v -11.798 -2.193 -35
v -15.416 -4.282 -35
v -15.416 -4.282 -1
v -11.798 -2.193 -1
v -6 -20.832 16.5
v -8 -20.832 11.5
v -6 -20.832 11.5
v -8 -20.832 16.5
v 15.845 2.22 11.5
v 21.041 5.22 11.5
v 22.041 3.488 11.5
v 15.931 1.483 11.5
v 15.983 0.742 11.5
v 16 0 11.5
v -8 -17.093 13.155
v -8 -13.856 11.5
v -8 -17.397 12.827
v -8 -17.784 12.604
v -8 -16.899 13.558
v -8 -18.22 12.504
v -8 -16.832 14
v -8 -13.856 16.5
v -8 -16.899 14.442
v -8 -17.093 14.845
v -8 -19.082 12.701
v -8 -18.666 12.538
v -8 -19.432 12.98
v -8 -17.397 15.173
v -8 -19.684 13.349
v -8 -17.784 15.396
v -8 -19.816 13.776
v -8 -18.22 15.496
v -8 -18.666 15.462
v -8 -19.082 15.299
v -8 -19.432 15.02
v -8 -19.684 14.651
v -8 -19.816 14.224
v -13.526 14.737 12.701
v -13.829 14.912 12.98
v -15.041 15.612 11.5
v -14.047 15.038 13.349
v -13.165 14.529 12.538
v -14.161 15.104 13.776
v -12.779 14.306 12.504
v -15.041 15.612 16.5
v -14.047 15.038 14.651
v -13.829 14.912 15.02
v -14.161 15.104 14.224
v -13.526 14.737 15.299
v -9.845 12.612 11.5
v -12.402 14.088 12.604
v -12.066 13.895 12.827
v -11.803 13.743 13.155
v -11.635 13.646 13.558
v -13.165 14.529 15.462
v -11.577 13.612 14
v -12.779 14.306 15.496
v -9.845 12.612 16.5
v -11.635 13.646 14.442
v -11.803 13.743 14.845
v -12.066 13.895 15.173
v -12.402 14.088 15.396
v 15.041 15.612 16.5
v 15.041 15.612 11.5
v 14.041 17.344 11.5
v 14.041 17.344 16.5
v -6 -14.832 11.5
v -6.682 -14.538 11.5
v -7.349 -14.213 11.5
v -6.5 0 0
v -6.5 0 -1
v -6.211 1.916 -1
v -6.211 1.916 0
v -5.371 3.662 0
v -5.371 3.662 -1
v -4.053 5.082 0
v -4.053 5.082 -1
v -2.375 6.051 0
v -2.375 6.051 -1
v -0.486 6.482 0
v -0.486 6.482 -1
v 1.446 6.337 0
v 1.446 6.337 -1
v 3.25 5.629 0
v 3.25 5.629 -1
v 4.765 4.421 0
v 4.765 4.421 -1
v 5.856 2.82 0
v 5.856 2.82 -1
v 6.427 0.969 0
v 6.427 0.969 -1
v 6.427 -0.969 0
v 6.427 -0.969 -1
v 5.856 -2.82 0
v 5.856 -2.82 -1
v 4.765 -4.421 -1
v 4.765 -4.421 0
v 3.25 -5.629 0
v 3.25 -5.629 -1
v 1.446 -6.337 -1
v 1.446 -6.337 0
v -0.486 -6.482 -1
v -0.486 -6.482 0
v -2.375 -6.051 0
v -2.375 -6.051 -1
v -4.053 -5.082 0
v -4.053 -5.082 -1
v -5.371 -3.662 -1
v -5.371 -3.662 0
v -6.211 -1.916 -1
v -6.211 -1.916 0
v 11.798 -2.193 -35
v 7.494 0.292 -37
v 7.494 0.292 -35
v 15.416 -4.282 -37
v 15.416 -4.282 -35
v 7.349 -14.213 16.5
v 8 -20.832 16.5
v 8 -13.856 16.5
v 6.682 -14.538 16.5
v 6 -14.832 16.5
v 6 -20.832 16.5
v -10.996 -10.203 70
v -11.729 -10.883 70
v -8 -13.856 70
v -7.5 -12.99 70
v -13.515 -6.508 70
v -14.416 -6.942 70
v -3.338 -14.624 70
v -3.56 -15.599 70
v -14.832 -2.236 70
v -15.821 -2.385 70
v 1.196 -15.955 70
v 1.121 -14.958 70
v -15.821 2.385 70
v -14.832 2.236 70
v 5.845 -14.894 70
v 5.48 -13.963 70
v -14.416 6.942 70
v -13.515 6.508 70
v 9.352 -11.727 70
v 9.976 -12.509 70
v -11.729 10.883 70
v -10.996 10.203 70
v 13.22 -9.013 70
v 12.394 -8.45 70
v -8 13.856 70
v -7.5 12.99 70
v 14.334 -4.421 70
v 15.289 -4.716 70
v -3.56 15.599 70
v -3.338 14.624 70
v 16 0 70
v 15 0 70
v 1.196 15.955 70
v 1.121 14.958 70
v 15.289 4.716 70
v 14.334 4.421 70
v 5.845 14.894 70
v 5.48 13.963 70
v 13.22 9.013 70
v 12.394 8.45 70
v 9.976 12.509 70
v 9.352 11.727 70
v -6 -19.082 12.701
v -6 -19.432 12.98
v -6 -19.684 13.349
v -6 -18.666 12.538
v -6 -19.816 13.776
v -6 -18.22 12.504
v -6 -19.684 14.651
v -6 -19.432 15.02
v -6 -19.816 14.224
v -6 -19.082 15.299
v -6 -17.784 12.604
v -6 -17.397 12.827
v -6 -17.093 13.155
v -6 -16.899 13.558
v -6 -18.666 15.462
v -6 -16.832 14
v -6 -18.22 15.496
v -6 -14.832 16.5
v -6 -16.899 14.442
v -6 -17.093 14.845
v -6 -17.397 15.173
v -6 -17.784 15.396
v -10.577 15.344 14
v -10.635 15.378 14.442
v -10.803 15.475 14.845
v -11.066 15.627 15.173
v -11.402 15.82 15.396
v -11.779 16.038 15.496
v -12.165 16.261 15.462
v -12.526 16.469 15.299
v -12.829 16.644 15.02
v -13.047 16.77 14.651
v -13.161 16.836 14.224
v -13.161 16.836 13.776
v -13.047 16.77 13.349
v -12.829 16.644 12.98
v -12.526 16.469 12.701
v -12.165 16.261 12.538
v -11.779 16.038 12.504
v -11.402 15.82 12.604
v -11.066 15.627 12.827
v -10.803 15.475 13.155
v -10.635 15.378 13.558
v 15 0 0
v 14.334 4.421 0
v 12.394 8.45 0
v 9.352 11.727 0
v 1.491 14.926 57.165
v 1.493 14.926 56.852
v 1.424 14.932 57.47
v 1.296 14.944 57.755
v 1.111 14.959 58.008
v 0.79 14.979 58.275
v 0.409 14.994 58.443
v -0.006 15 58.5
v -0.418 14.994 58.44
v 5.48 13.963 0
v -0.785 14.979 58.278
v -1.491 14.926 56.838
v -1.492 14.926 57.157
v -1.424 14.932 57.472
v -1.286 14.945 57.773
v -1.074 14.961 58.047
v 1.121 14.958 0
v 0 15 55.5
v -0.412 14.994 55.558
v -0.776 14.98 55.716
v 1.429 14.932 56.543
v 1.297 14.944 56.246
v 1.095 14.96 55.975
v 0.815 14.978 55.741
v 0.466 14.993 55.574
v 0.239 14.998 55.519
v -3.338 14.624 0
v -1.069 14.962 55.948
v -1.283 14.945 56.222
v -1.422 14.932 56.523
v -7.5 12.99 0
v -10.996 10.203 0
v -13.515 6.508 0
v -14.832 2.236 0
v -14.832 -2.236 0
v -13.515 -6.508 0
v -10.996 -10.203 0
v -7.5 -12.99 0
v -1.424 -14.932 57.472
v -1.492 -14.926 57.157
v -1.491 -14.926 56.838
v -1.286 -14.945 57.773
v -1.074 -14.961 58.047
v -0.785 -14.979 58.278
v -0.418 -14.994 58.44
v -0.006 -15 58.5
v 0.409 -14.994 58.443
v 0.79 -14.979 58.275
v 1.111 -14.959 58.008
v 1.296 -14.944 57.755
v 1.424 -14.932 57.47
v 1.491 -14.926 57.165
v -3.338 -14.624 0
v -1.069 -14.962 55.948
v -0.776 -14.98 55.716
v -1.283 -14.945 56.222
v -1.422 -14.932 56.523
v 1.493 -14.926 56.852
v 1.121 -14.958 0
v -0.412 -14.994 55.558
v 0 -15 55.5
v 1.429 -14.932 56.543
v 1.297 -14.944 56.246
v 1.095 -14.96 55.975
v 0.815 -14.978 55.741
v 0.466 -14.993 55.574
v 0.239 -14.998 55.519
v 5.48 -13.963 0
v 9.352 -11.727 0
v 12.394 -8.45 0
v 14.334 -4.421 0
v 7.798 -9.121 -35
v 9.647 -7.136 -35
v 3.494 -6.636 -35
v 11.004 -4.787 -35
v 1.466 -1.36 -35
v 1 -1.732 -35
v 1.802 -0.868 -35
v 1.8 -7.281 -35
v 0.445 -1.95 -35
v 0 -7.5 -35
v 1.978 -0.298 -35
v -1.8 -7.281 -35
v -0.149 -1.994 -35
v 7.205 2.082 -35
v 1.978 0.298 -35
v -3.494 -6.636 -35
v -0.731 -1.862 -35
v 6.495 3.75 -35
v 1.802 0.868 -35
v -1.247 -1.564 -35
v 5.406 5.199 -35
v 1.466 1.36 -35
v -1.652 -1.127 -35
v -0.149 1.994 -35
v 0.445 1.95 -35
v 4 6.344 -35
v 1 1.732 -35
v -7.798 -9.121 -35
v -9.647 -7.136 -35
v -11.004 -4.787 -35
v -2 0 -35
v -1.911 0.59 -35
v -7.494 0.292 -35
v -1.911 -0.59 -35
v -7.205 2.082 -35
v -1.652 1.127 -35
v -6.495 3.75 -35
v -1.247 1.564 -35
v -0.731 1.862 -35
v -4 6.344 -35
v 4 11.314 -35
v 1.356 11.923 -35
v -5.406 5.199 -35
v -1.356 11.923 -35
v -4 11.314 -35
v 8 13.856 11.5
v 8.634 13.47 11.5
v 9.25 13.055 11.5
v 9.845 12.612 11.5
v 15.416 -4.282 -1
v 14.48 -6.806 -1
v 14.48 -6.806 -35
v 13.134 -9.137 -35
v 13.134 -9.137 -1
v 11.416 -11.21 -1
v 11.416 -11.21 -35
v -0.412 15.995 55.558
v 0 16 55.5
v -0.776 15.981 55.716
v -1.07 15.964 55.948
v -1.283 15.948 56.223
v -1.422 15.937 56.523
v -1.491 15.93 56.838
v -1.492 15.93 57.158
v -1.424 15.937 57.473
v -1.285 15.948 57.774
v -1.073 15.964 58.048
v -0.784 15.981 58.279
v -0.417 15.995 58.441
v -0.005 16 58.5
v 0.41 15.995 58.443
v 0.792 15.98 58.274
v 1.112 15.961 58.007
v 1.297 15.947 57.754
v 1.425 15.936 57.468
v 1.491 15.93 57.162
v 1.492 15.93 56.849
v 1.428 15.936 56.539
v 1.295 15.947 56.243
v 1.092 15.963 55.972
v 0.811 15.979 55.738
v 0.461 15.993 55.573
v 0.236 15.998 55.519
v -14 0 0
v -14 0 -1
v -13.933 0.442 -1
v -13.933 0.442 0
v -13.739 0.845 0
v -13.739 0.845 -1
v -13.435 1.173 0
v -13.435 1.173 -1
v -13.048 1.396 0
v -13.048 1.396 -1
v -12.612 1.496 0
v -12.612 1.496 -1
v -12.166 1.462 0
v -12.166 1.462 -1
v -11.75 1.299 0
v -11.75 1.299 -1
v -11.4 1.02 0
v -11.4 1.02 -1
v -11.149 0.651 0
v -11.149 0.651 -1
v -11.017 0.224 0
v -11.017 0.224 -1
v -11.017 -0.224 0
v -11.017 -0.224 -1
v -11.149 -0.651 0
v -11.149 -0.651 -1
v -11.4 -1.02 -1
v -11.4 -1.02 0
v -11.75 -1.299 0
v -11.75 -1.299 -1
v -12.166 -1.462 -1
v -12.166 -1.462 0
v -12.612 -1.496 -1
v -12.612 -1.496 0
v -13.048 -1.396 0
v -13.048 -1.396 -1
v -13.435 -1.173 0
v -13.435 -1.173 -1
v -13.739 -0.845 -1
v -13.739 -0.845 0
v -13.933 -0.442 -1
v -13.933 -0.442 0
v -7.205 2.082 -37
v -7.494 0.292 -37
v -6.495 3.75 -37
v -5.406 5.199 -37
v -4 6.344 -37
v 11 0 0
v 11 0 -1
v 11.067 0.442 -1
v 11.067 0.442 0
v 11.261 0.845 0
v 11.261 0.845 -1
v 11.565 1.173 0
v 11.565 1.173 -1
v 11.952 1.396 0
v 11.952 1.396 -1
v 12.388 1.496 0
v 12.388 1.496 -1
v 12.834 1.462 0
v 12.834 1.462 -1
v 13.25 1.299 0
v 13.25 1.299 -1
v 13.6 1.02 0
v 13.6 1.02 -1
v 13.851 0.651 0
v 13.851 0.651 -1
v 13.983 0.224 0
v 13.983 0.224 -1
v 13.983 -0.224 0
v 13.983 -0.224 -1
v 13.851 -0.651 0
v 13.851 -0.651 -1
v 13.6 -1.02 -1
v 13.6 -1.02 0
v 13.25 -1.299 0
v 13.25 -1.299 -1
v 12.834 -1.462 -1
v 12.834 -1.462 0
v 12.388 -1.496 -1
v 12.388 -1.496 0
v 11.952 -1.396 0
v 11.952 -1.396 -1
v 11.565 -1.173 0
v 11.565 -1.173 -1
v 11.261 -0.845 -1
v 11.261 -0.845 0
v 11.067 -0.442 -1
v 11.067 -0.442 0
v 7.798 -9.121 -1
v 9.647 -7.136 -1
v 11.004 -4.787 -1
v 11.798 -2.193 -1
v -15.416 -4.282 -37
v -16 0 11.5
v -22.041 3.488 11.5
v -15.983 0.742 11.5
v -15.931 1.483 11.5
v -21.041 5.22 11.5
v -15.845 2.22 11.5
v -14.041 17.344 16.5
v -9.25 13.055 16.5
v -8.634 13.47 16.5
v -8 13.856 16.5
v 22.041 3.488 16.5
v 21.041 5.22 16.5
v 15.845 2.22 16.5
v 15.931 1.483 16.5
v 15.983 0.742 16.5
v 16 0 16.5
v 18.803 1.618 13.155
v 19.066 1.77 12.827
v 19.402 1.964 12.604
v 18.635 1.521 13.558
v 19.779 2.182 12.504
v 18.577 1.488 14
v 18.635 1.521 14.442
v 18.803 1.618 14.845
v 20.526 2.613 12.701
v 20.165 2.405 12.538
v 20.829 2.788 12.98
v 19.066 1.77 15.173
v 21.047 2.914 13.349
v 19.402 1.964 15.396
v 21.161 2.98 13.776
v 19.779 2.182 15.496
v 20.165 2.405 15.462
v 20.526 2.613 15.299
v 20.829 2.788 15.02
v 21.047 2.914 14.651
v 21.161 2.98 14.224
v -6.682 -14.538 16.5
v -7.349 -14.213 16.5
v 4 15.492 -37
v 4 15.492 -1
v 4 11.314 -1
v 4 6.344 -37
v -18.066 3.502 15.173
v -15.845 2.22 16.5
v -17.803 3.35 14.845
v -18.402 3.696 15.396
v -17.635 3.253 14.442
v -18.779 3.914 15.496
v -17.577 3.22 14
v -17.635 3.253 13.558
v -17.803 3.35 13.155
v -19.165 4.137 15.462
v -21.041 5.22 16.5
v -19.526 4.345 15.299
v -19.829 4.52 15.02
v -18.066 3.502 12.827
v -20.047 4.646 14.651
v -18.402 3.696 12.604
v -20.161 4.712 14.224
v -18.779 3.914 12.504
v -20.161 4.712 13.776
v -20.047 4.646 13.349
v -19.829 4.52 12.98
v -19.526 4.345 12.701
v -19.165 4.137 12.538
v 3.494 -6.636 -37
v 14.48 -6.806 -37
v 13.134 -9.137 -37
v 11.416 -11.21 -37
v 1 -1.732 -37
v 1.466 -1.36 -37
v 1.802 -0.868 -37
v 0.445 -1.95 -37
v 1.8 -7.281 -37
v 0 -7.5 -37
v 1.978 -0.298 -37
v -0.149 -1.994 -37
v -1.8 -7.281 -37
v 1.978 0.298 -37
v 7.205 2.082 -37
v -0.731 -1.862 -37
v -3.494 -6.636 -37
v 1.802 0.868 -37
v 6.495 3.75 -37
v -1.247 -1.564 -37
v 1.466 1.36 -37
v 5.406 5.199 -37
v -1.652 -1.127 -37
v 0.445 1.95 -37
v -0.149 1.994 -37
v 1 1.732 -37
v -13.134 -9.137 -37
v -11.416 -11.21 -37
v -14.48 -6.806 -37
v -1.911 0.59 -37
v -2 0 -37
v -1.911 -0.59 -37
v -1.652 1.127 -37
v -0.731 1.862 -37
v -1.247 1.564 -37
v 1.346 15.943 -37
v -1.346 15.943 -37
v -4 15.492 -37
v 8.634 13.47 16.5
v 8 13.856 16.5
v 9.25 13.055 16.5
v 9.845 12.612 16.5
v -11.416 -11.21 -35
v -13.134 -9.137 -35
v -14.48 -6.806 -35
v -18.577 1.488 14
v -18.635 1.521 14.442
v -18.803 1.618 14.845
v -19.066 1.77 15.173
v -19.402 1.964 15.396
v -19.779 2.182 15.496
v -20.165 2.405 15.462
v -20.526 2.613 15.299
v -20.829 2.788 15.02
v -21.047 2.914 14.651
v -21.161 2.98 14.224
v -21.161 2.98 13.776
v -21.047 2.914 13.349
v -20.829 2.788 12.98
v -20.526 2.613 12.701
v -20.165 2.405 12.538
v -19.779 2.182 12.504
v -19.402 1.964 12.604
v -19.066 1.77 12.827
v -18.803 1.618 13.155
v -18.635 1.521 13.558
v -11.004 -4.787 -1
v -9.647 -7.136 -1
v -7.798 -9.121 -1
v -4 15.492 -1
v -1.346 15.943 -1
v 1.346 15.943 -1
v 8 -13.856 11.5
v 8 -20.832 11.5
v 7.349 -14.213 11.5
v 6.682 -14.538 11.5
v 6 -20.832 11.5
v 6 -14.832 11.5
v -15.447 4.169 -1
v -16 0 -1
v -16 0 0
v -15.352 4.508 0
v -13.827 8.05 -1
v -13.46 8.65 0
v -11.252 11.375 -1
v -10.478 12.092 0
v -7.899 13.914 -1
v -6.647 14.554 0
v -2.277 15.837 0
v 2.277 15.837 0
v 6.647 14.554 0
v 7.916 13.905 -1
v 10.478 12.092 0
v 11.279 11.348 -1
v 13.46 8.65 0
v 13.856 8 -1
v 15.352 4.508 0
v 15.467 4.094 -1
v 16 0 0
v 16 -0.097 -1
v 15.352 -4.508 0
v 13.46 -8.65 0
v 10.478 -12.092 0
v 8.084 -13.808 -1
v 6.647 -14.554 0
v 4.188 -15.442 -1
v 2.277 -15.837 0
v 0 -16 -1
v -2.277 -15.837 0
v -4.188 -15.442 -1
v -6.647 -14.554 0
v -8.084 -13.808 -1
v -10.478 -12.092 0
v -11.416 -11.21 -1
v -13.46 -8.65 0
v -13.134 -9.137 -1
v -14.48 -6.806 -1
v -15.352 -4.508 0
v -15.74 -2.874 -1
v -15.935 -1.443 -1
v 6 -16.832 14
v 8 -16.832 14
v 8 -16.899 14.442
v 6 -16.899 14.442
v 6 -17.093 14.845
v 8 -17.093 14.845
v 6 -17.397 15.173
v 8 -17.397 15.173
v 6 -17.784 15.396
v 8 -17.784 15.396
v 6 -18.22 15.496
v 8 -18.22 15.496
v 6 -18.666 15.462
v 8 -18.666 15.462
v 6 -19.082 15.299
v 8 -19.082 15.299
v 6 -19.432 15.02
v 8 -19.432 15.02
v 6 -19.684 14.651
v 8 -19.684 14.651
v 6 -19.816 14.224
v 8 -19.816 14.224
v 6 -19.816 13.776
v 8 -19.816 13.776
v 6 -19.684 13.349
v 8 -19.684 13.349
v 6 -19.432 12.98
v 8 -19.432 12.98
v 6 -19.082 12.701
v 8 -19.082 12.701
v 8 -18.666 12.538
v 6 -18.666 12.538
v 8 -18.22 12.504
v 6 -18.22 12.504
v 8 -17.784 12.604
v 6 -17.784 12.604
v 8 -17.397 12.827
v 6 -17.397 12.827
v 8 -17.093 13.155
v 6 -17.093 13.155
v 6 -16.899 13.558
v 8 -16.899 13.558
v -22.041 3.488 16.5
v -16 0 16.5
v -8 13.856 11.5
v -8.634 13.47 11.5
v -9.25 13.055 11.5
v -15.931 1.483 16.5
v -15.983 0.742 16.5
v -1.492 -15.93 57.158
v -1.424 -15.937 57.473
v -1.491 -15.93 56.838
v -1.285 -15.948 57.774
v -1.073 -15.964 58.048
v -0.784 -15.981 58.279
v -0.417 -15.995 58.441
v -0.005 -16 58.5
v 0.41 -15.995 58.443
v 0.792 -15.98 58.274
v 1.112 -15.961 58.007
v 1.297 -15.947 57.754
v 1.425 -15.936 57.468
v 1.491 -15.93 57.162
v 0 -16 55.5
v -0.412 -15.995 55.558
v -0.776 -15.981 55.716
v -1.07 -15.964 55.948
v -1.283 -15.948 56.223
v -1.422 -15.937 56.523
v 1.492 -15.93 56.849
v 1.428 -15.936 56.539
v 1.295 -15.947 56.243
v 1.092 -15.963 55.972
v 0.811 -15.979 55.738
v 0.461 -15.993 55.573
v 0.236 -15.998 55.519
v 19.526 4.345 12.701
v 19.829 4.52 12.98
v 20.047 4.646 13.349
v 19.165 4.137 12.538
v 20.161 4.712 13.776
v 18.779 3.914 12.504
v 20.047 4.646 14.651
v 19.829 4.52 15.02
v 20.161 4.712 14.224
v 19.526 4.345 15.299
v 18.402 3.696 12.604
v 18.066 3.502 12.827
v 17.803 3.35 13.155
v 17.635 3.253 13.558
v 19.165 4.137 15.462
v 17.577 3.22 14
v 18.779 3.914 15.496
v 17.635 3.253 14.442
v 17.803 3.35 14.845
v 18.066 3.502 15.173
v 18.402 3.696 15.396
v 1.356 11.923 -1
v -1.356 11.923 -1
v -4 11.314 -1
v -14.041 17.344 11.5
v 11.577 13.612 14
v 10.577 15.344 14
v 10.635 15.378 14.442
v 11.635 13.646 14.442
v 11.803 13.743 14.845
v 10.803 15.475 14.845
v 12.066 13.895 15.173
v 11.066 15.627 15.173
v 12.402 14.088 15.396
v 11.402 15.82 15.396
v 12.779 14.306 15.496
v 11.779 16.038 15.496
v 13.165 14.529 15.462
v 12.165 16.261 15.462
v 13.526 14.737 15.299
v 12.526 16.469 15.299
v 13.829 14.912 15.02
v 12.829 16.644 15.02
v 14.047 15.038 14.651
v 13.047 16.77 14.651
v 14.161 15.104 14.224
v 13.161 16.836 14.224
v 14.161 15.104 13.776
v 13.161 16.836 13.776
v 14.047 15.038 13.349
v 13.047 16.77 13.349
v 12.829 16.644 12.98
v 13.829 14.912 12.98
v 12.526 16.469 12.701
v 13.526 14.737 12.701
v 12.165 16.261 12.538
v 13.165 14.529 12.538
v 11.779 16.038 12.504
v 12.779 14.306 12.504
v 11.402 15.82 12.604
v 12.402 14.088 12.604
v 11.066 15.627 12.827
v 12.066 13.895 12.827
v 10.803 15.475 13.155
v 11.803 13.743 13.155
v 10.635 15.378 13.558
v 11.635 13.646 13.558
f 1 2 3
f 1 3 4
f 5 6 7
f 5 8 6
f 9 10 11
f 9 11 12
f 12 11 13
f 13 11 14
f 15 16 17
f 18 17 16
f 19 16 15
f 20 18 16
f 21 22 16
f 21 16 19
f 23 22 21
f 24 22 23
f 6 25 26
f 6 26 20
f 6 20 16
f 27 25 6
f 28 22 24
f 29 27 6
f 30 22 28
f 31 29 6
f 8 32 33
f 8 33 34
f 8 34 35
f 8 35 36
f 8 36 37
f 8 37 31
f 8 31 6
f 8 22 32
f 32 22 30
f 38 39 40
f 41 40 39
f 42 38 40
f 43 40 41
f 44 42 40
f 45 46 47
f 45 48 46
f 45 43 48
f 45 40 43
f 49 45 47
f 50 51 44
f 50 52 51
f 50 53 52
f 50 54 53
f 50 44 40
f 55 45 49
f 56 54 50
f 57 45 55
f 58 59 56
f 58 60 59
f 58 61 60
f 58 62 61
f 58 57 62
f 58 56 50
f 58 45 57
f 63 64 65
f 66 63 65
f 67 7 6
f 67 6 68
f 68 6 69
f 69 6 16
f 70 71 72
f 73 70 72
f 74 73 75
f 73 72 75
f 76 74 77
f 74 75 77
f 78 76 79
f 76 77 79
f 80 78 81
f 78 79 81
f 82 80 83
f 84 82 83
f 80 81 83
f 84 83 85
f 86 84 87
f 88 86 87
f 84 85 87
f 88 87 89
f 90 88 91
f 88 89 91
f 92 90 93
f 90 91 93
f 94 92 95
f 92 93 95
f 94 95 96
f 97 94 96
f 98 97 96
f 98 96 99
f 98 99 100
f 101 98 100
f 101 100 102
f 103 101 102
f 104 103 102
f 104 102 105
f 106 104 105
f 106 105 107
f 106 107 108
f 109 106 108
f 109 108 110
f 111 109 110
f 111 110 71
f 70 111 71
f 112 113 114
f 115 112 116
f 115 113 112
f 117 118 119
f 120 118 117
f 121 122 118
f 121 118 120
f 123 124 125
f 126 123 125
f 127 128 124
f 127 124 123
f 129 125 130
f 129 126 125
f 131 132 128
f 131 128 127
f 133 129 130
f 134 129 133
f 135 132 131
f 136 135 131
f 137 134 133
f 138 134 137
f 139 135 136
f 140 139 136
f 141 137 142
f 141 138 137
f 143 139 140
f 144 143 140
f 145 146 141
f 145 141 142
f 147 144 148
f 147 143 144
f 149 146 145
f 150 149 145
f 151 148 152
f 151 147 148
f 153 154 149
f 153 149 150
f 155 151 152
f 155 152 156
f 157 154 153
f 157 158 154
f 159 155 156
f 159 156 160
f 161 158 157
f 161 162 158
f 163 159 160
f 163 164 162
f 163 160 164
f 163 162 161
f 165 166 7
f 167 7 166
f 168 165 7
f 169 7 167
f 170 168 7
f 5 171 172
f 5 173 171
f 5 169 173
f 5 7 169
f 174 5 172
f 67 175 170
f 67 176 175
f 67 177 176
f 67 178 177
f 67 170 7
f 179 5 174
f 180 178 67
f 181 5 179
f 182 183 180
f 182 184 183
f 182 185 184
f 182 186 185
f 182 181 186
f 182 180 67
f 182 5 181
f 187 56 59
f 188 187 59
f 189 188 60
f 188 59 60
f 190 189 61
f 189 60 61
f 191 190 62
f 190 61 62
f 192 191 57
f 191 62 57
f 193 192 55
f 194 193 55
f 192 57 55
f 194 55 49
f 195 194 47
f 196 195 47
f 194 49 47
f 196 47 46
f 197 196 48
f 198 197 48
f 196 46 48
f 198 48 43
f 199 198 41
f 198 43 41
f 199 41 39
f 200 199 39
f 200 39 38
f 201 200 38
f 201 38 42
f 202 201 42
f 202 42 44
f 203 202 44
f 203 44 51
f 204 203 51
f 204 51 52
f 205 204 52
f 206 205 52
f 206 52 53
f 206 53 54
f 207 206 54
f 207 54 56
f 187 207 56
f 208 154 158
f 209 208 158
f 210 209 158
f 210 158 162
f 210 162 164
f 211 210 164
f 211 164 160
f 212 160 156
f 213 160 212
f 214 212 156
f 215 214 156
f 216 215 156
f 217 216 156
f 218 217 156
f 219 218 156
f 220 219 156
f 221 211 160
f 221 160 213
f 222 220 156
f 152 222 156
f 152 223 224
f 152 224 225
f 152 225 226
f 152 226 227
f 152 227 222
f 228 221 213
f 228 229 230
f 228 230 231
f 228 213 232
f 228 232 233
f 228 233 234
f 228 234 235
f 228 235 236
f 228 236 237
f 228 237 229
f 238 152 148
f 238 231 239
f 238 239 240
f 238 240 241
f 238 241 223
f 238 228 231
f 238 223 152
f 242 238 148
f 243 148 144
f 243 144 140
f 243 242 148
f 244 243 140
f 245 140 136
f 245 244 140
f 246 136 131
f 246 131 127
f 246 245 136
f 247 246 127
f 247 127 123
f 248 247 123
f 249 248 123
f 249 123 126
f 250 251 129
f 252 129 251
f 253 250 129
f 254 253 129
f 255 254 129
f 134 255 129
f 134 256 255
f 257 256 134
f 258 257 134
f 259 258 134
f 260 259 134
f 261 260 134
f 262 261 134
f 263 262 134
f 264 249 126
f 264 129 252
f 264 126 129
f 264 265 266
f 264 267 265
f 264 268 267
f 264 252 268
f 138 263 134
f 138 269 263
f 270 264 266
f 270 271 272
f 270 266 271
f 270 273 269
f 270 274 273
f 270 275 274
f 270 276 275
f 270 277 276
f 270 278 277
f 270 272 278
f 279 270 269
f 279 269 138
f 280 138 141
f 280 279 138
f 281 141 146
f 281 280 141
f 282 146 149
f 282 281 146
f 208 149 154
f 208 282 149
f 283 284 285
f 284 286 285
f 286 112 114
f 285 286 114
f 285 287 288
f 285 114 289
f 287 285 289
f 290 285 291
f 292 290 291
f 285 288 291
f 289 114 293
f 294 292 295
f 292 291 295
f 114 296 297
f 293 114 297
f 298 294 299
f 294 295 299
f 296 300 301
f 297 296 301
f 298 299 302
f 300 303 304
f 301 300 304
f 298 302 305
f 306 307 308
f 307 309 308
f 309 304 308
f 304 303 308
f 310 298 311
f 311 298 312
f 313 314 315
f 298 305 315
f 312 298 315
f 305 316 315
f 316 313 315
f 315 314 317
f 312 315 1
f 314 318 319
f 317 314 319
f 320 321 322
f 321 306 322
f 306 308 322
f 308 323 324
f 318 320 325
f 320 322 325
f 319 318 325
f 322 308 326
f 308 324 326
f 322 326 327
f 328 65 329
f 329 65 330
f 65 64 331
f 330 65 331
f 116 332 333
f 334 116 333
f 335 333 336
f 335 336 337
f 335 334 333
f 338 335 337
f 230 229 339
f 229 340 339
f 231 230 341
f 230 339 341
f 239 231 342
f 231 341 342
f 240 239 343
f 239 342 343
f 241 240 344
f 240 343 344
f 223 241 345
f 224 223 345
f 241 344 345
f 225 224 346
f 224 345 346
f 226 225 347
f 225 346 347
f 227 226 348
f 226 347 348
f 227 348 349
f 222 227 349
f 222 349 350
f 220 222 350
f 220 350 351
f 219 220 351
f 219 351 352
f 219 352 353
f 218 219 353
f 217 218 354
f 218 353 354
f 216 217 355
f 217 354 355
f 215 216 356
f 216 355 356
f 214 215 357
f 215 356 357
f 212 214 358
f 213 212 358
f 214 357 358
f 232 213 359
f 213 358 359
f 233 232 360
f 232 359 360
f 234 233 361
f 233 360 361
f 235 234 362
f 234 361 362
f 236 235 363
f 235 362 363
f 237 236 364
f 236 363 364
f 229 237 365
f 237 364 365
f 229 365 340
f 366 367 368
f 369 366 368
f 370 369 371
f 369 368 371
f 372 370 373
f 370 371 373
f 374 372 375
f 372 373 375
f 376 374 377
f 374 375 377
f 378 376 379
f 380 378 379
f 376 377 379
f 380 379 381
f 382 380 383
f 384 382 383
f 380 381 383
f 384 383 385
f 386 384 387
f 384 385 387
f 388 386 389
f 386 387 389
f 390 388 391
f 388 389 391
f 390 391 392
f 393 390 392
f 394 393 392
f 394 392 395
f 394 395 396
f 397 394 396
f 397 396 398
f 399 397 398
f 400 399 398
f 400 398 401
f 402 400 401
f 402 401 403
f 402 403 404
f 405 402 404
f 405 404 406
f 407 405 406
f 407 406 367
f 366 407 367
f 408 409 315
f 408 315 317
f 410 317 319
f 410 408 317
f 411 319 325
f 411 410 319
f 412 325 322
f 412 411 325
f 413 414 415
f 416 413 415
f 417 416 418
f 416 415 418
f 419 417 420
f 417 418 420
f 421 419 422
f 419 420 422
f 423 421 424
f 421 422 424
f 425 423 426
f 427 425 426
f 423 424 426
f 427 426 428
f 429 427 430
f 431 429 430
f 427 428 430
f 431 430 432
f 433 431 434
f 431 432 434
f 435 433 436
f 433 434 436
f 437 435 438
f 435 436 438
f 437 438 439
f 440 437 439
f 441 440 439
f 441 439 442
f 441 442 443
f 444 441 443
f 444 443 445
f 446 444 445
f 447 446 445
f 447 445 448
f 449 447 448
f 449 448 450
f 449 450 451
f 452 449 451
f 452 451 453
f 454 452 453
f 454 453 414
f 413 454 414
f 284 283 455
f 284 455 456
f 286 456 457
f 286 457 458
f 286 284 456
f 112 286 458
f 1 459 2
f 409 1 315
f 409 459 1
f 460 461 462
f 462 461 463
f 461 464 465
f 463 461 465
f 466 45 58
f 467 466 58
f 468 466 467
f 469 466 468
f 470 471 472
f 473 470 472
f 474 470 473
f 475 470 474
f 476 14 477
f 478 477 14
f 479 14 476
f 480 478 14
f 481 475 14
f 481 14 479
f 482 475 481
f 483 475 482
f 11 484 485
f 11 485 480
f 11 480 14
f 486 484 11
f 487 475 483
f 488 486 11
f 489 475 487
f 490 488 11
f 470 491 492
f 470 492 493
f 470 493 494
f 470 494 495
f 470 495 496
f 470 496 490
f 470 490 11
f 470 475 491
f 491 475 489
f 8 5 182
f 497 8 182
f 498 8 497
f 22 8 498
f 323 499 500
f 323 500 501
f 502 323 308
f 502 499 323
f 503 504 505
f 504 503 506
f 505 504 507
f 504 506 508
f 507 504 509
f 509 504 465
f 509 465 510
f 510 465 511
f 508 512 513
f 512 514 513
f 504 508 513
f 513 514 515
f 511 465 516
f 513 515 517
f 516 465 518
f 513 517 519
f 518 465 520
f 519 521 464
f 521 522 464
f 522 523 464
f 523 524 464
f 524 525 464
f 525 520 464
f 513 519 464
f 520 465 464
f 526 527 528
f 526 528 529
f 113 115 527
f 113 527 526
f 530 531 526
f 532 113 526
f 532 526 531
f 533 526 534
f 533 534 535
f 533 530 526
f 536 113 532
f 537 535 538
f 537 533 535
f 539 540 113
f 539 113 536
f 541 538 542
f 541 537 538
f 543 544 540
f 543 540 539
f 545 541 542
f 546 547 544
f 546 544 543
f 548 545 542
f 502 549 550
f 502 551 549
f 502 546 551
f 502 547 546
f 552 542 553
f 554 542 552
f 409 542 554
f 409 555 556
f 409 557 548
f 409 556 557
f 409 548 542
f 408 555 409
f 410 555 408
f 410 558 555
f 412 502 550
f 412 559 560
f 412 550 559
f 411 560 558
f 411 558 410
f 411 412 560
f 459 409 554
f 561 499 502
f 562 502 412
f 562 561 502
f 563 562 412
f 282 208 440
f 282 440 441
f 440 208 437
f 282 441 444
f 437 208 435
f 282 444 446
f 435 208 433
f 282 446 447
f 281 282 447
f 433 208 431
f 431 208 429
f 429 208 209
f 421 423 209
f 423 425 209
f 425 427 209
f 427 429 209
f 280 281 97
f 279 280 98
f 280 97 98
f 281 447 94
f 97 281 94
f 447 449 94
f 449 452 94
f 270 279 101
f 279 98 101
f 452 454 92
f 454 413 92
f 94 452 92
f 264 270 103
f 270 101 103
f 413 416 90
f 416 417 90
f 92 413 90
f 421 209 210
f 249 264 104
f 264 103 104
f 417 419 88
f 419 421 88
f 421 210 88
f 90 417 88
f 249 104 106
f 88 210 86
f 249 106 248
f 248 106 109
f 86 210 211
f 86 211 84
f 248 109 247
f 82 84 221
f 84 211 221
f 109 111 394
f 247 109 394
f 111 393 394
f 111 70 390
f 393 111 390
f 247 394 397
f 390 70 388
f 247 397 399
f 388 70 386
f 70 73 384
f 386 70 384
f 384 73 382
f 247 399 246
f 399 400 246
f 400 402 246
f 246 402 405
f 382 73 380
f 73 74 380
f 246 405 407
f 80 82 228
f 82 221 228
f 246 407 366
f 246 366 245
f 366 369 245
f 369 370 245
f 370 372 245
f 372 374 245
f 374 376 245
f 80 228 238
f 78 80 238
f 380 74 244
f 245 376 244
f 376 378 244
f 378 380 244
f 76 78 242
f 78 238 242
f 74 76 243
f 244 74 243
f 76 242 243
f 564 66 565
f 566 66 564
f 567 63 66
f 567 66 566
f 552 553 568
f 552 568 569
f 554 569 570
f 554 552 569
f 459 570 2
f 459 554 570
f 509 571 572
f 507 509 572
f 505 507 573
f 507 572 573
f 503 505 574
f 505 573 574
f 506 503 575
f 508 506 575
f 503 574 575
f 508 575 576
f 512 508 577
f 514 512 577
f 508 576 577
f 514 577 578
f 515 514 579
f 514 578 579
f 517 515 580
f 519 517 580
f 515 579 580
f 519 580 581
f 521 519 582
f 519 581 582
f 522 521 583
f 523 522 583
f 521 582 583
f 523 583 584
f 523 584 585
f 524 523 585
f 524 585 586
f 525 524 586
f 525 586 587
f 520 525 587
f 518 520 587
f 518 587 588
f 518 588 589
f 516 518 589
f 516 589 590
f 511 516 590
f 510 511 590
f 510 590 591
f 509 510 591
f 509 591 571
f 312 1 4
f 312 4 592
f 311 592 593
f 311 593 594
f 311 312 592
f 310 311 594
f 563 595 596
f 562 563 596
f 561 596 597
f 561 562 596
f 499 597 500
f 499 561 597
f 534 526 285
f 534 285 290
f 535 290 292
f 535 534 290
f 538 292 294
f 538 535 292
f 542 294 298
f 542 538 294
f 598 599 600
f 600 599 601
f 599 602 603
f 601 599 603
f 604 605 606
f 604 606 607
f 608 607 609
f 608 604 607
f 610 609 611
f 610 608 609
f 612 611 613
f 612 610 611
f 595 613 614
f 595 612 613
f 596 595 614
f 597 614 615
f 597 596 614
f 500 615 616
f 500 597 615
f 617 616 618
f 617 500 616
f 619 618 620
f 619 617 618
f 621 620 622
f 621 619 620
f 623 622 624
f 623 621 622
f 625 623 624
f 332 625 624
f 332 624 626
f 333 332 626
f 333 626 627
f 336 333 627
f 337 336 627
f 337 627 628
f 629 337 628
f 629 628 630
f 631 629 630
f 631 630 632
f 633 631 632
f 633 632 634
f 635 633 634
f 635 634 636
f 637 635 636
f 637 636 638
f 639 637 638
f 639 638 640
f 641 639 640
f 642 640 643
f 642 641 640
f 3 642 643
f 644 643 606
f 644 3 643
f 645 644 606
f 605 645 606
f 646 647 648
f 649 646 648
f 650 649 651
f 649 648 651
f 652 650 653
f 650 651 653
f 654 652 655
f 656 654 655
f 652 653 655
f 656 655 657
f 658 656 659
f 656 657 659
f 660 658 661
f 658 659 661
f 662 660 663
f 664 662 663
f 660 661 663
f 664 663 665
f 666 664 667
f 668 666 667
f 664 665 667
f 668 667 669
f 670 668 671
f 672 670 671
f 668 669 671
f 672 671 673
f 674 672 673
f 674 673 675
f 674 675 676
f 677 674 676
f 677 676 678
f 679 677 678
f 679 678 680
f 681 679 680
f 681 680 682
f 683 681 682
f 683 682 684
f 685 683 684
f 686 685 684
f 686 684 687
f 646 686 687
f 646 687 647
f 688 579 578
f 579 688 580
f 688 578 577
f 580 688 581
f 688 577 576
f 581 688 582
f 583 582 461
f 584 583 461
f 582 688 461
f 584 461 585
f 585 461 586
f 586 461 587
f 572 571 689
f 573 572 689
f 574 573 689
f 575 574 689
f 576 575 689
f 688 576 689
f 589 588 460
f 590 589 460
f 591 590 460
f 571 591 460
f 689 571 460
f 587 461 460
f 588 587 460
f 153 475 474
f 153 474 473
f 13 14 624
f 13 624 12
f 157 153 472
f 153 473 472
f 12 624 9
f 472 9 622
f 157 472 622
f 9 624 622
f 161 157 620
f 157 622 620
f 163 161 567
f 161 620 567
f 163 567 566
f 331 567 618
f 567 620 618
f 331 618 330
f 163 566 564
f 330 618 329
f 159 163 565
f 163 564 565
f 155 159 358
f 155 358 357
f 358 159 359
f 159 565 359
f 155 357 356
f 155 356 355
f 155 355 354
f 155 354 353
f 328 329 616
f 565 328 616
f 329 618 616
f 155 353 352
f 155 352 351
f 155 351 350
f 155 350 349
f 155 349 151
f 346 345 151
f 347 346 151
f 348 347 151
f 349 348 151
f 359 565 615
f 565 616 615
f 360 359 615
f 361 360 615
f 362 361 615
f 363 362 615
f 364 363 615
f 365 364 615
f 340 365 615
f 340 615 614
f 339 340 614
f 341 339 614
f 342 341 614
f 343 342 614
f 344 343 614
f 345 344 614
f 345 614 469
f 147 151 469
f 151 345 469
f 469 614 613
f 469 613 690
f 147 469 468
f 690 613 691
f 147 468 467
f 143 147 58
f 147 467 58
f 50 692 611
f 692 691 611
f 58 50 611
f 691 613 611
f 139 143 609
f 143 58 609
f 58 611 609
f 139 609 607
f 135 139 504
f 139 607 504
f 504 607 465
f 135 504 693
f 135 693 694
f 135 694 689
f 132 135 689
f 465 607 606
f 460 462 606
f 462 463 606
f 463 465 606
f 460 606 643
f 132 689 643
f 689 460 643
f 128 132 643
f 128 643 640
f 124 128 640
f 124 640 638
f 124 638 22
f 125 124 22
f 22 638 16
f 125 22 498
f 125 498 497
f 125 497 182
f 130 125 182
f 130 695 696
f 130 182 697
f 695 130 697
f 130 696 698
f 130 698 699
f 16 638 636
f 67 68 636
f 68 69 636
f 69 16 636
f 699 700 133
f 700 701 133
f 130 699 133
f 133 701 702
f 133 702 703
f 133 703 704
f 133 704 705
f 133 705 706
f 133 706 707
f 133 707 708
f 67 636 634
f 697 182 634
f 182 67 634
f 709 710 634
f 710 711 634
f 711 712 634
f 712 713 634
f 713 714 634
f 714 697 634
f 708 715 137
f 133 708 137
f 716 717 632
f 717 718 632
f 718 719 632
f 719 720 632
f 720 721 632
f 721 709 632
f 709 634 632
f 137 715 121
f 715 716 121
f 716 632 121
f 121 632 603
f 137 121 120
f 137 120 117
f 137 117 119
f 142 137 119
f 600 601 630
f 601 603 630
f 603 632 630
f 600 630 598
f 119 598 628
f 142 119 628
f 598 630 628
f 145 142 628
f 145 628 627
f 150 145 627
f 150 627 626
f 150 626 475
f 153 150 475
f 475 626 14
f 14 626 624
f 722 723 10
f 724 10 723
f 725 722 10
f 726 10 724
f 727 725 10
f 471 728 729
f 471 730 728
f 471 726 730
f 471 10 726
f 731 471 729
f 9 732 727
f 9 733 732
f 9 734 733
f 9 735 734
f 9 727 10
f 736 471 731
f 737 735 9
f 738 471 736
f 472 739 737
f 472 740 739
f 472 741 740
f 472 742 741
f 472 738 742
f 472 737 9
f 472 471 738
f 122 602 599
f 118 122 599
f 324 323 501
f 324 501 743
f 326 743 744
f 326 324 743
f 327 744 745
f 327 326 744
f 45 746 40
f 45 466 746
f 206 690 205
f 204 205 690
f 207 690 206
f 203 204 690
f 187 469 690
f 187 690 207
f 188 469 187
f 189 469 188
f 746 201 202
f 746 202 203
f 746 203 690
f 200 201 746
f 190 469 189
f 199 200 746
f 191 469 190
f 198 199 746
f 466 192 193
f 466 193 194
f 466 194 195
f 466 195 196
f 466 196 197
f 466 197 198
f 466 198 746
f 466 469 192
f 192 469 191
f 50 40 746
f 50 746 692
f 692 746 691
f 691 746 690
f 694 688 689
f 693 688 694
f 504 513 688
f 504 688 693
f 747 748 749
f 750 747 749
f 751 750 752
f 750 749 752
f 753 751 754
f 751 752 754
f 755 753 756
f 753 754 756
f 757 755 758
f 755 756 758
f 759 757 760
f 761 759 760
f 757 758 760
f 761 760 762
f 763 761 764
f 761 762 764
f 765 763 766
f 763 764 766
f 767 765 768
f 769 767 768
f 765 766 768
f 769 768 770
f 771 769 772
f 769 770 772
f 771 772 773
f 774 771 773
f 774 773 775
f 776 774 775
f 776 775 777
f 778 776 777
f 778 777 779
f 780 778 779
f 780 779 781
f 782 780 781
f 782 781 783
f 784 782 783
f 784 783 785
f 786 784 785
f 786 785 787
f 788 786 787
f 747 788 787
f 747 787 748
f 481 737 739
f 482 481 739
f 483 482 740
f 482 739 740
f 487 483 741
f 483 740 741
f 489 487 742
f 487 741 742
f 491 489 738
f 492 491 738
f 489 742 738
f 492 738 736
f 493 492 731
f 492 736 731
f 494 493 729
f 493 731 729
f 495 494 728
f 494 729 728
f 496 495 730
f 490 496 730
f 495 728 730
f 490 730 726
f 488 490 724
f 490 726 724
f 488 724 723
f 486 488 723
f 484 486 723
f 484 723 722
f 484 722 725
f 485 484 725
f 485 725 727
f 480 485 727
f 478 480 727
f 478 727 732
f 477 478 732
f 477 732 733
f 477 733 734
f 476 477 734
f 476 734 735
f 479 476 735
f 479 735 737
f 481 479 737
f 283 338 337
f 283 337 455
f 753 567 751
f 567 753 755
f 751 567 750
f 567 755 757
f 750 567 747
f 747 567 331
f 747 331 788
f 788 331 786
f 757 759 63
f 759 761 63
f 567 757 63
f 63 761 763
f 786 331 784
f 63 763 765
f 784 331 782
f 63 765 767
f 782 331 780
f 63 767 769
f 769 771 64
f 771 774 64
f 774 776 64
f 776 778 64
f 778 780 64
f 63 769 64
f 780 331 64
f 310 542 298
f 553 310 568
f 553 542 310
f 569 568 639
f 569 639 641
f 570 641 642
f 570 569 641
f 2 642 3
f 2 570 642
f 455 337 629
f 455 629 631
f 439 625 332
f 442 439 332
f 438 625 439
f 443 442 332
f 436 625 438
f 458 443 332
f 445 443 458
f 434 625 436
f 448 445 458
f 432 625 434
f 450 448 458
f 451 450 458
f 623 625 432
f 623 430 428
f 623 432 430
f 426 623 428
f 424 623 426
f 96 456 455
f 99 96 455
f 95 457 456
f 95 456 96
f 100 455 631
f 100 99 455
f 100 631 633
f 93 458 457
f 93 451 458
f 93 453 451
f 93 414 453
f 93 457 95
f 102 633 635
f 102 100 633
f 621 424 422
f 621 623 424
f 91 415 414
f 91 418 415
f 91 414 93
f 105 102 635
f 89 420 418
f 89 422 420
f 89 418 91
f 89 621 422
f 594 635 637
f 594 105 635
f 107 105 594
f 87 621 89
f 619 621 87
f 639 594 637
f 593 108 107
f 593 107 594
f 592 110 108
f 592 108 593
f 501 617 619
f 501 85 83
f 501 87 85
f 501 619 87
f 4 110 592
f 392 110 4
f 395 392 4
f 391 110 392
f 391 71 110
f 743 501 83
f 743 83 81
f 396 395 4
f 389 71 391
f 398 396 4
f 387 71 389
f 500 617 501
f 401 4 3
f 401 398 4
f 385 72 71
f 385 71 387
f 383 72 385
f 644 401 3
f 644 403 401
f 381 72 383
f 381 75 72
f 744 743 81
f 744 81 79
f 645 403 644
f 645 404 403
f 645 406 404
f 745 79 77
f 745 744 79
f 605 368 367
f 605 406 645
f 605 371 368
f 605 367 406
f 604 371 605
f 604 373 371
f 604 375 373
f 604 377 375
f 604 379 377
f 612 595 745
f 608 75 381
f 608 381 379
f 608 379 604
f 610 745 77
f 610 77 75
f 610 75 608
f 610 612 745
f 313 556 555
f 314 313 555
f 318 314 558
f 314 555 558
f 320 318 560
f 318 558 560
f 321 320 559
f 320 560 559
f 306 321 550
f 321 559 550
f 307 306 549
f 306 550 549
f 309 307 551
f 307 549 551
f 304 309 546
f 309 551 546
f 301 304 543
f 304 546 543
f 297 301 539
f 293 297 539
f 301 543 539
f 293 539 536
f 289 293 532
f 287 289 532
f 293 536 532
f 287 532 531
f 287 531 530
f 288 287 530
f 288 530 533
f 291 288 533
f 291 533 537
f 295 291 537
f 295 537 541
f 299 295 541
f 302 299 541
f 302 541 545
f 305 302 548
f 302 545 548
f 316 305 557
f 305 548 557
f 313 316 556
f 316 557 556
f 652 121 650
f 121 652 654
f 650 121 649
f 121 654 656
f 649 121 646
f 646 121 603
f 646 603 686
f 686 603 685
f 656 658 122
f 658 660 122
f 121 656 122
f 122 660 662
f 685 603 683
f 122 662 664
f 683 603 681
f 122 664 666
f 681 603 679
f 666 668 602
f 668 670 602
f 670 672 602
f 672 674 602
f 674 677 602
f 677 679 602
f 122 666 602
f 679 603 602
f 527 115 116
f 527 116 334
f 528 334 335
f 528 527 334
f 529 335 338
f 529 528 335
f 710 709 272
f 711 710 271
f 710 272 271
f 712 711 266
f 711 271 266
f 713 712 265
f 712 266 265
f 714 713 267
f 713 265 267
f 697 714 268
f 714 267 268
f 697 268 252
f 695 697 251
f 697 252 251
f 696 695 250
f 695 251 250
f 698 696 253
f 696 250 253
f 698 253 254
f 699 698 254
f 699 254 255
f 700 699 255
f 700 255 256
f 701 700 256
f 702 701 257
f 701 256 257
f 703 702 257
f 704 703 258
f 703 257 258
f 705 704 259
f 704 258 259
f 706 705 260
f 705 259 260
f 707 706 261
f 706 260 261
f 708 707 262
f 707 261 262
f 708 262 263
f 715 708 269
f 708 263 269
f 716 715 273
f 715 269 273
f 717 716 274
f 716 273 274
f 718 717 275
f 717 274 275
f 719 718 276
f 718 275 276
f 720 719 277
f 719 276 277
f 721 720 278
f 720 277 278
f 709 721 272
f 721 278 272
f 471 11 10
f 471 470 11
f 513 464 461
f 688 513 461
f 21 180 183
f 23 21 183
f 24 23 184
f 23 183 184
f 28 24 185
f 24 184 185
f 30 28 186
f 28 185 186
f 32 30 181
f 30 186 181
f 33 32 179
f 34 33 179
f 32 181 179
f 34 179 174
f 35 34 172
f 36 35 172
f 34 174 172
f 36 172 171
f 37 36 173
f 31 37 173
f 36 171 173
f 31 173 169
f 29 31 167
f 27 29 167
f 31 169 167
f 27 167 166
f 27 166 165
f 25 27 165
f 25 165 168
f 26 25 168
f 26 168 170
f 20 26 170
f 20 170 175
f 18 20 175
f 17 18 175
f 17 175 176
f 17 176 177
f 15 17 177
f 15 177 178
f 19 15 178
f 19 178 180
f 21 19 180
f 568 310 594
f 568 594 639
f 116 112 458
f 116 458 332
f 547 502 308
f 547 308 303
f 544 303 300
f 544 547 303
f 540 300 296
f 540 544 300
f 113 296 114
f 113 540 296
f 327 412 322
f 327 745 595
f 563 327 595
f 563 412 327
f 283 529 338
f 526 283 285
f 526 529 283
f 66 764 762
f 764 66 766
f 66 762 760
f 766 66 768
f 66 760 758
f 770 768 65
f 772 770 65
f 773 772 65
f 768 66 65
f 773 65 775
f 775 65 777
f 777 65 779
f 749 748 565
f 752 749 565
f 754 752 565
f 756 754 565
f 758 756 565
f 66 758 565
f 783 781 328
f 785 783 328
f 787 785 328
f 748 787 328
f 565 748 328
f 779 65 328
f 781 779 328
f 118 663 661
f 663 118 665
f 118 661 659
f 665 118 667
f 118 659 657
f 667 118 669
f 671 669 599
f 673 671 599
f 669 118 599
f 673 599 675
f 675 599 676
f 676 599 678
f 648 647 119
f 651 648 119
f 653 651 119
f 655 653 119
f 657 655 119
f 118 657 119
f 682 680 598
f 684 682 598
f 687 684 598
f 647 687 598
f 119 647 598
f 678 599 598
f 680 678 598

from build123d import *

# Parameters (mm, degrees)
SKETCH1_R           = 16
SKETCH1_R_2         = 15
BOSS_EXTRUDE1_DEPTH = 70
BOSS_EXTRUDE2_START = 1
SKETCH3_R           = 16
BOSS_EXTRUDE2_DEPTH = 1
CUT_EXTRUDE2_REACH  = 76.518
SKETCH4_R           = 6.5
BOSS_EXTRUDE3_START = 34
BOSS_EXTRUDE3_DEPTH = 34
BOSS_EXTRUDE4_START = 2
SKETCH6_R           = 2
BOSS_EXTRUDE4_DEPTH = 2
BOSS_EXTRUDE5_DEPTH = 2.5
SKETCH8_R           = 1.5
CUT_EXTRUDE3_DEPTH  = 77.740858419
CIRPATTERN1_COUNT   = 3
SKETCH9_R           = 1.5
CUT_EXTRUDE4_DEPTH  = 78.206291301
SKETCH10_W          = 1.5
SKETCH10_H          = 40


with BuildPart() as part:
    # Sketch1 → Boss-Extrude1 (new body)
    with BuildSketch(Plane.XY):
        Circle(SKETCH1_R)
        Circle(SKETCH1_R_2, mode=Mode.SUBTRACT)
    extrude(amount=BOSS_EXTRUDE1_DEPTH)

    # Sketch3 → Boss-Extrude2 (add)
    with BuildSketch(Plane(origin=(0, 0, 0), x_dir=(-1, 0, 0), z_dir=(0, 0, -1)).offset(BOSS_EXTRUDE2_START)):
        Circle(SKETCH3_R)
    extrude(amount=-BOSS_EXTRUDE2_DEPTH)

    # Sketch4 → Cut-Extrude2 (cut, up to next)
    with BuildSketch(Plane(origin=(0, 0, -1), x_dir=(-1, 0, 0), z_dir=(0, 0, -1)), mode=Mode.PRIVATE) as cut_extrude2_sk1:
        Circle(SKETCH4_R)
    cut_extrude2_tool1 = extrude(cut_extrude2_sk1.sketch, amount=-CUT_EXTRUDE2_REACH, mode=Mode.PRIVATE) & part.part
    add(cut_extrude2_tool1.solids().sort_by_distance((0, 0, -1))[0], mode=Mode.SUBTRACT)

    # Sketch5 → Boss-Extrude3 (add)
    with BuildSketch(Plane(origin=(0, 0, -1), x_dir=(-1, 0, 0), z_dir=(0, 0, -1)).offset(BOSS_EXTRUDE3_START)):
        with BuildLine():
            Line((-4, 15.491933385), (-4, 11.313708499))
            ThreePointArc((-4, 11.313708499), (0, 12), (4, 11.313708499))
            Line((4, 11.313708499), (4, 15.491933385))
            ThreePointArc((4, 15.491933385), (0, 16), (-4, 15.491933385))
        make_face()
        with BuildLine():
            Line((15.416407865, -4.281865077), (11.797958971, -2.192752634))
            ThreePointArc((11.797958971, -2.192752634), (10.392304845, -6), (7.797958971, -9.120955865))
            Line((7.797958971, -9.120955865), (11.416407865, -11.210068308))
            ThreePointArc((11.416407865, -11.210068308), (13.856406461, -8), (15.416407865, -4.281865077))
        make_face()
        with BuildLine():
            Line((-11.416407865, -11.210068308), (-7.797958971, -9.120955865))
            ThreePointArc((-7.797958971, -9.120955865), (-10.392304845, -6), (-11.797958971, -2.192752634))
            Line((-11.797958971, -2.192752634), (-15.416407865, -4.281865077))
            ThreePointArc((-15.416407865, -4.281865077), (-13.856406461, -8), (-11.416407865, -11.210068308))
        make_face()
    extrude(amount=-BOSS_EXTRUDE3_DEPTH)

    # Sketch6 → Boss-Extrude4 (add)
    with BuildSketch(Plane(origin=(0, 0, -35), x_dir=(-1, 0, 0), z_dir=(0, 0, -1)).offset(BOSS_EXTRUDE4_START)):
        with BuildLine():
            Line((-4, 15.491933385), (-4, 6.34428877))
            ThreePointArc((-4, 6.34428877), (-6.495190528, 3.75), (-7.494315244, 0.29195723))
            Line((-7.494315244, 0.29195723), (-15.416407865, -4.281865077))
            ThreePointArc((-15.416407865, -4.281865077), (-13.856406461, -8), (-11.416407865, -11.210068308))
            Line((-11.416407865, -11.210068308), (-3.494315244, -6.636246))
            ThreePointArc((-3.494315244, -6.636246), (0, -7.5), (3.494315244, -6.636246))
            Line((3.494315244, -6.636246), (11.416407865, -11.210068308))
            ThreePointArc((11.416407865, -11.210068308), (13.856406461, -8), (15.416407865, -4.281865077))
            Line((15.416407865, -4.281865077), (7.494315244, 0.29195723))
            ThreePointArc((7.494315244, 0.29195723), (6.495190528, 3.75), (4, 6.34428877))
            Line((4, 6.34428877), (4, 15.491933385))
            ThreePointArc((4, 15.491933385), (0, 16), (-4, 15.491933385))
        make_face()
        Circle(SKETCH6_R, mode=Mode.SUBTRACT)
    extrude(amount=-BOSS_EXTRUDE4_DEPTH)

    # Sketch7 → Boss-Extrude5 (add, symmetric)
    with BuildSketch(Plane(origin=(0, 0, 14), x_dir=(-1, 0, 0), z_dir=(0, 0, -1))):
        with BuildLine():
            Line((15.041385001, 15.61235091), (9.845232579, 12.61235091))
            ThreePointArc((9.845232579, 12.61235091), (8.94427191, 13.266499161), (8, 13.856406461))
            Line((8, 13.856406461), (14.041385001, 17.344401717))
            Line((14.041385001, 17.344401717), (15.041385001, 15.61235091))
        make_face()
        with BuildLine():
            Line((21.041385001, 5.220046064), (22.041385001, 3.487995257))
            Line((22.041385001, 3.487995257), (16, 0))
            ThreePointArc((16, 0), (15.961261248, 1.112717112), (15.845232579, 2.220046064))
            Line((15.845232579, 2.220046064), (21.041385001, 5.220046064))
        make_face()
    boss_extrude5 = extrude(amount=BOSS_EXTRUDE5_DEPTH, both=True)

    # Sketch8 → Cut-Extrude3 (cut, through all)
    with BuildSketch(Plane(origin=(-4, -6.92820323, 0), x_dir=(0.8660254037844398, -0.49999999999999806, 0), z_dir=(-0.499999999999998, -0.8660254037844397, 0))):
        with Locations((-18.332396974, 14)):
            Circle(SKETCH8_R)
    cut_extrude3 = extrude(amount=-CUT_EXTRUDE3_DEPTH, mode=Mode.SUBTRACT)

    # CirPattern1: Boss-Extrude5, Cut-Extrude3 ×3 about axis
    cirpattern1_axis = Axis((0, 0, 0), (0, 0, 1))
    add([boss_extrude5.rotate(cirpattern1_axis, i * 360 / CIRPATTERN1_COUNT) for i in range(1, CIRPATTERN1_COUNT)])
    add([cut_extrude3.rotate(cirpattern1_axis, i * 360 / CIRPATTERN1_COUNT) for i in range(1, CIRPATTERN1_COUNT)], mode=Mode.SUBTRACT)

    # Sketch9 → Cut-Extrude4 (cut, through all)
    with BuildSketch(Plane(origin=(0, 0, -1), x_dir=(-1, 0, 0), z_dir=(0, 0, -1))):
        with Locations((-12.5, 0)):
            Circle(SKETCH9_R)
        with Locations((12.5, 0)):
            Circle(SKETCH9_R)
    extrude(amount=-CUT_EXTRUDE4_DEPTH, mode=Mode.SUBTRACT)

    # Sketch10 → Cut-Revolve1 (revolve, cut)
    with BuildSketch(Plane.XY.offset(57), mode=Mode.PRIVATE) as cut_revolve1_sk:
        with Locations((0.75, 0)):
            Rectangle(SKETCH10_W, SKETCH10_H)
    revolve(cut_revolve1_sk.sketch.rotate(Axis((0, 0, 57), (0, 1, 0)), 90), axis=Axis((0, 0, 57), (0, 1, 0)), mode=Mode.SUBTRACT)


solid = part.part
